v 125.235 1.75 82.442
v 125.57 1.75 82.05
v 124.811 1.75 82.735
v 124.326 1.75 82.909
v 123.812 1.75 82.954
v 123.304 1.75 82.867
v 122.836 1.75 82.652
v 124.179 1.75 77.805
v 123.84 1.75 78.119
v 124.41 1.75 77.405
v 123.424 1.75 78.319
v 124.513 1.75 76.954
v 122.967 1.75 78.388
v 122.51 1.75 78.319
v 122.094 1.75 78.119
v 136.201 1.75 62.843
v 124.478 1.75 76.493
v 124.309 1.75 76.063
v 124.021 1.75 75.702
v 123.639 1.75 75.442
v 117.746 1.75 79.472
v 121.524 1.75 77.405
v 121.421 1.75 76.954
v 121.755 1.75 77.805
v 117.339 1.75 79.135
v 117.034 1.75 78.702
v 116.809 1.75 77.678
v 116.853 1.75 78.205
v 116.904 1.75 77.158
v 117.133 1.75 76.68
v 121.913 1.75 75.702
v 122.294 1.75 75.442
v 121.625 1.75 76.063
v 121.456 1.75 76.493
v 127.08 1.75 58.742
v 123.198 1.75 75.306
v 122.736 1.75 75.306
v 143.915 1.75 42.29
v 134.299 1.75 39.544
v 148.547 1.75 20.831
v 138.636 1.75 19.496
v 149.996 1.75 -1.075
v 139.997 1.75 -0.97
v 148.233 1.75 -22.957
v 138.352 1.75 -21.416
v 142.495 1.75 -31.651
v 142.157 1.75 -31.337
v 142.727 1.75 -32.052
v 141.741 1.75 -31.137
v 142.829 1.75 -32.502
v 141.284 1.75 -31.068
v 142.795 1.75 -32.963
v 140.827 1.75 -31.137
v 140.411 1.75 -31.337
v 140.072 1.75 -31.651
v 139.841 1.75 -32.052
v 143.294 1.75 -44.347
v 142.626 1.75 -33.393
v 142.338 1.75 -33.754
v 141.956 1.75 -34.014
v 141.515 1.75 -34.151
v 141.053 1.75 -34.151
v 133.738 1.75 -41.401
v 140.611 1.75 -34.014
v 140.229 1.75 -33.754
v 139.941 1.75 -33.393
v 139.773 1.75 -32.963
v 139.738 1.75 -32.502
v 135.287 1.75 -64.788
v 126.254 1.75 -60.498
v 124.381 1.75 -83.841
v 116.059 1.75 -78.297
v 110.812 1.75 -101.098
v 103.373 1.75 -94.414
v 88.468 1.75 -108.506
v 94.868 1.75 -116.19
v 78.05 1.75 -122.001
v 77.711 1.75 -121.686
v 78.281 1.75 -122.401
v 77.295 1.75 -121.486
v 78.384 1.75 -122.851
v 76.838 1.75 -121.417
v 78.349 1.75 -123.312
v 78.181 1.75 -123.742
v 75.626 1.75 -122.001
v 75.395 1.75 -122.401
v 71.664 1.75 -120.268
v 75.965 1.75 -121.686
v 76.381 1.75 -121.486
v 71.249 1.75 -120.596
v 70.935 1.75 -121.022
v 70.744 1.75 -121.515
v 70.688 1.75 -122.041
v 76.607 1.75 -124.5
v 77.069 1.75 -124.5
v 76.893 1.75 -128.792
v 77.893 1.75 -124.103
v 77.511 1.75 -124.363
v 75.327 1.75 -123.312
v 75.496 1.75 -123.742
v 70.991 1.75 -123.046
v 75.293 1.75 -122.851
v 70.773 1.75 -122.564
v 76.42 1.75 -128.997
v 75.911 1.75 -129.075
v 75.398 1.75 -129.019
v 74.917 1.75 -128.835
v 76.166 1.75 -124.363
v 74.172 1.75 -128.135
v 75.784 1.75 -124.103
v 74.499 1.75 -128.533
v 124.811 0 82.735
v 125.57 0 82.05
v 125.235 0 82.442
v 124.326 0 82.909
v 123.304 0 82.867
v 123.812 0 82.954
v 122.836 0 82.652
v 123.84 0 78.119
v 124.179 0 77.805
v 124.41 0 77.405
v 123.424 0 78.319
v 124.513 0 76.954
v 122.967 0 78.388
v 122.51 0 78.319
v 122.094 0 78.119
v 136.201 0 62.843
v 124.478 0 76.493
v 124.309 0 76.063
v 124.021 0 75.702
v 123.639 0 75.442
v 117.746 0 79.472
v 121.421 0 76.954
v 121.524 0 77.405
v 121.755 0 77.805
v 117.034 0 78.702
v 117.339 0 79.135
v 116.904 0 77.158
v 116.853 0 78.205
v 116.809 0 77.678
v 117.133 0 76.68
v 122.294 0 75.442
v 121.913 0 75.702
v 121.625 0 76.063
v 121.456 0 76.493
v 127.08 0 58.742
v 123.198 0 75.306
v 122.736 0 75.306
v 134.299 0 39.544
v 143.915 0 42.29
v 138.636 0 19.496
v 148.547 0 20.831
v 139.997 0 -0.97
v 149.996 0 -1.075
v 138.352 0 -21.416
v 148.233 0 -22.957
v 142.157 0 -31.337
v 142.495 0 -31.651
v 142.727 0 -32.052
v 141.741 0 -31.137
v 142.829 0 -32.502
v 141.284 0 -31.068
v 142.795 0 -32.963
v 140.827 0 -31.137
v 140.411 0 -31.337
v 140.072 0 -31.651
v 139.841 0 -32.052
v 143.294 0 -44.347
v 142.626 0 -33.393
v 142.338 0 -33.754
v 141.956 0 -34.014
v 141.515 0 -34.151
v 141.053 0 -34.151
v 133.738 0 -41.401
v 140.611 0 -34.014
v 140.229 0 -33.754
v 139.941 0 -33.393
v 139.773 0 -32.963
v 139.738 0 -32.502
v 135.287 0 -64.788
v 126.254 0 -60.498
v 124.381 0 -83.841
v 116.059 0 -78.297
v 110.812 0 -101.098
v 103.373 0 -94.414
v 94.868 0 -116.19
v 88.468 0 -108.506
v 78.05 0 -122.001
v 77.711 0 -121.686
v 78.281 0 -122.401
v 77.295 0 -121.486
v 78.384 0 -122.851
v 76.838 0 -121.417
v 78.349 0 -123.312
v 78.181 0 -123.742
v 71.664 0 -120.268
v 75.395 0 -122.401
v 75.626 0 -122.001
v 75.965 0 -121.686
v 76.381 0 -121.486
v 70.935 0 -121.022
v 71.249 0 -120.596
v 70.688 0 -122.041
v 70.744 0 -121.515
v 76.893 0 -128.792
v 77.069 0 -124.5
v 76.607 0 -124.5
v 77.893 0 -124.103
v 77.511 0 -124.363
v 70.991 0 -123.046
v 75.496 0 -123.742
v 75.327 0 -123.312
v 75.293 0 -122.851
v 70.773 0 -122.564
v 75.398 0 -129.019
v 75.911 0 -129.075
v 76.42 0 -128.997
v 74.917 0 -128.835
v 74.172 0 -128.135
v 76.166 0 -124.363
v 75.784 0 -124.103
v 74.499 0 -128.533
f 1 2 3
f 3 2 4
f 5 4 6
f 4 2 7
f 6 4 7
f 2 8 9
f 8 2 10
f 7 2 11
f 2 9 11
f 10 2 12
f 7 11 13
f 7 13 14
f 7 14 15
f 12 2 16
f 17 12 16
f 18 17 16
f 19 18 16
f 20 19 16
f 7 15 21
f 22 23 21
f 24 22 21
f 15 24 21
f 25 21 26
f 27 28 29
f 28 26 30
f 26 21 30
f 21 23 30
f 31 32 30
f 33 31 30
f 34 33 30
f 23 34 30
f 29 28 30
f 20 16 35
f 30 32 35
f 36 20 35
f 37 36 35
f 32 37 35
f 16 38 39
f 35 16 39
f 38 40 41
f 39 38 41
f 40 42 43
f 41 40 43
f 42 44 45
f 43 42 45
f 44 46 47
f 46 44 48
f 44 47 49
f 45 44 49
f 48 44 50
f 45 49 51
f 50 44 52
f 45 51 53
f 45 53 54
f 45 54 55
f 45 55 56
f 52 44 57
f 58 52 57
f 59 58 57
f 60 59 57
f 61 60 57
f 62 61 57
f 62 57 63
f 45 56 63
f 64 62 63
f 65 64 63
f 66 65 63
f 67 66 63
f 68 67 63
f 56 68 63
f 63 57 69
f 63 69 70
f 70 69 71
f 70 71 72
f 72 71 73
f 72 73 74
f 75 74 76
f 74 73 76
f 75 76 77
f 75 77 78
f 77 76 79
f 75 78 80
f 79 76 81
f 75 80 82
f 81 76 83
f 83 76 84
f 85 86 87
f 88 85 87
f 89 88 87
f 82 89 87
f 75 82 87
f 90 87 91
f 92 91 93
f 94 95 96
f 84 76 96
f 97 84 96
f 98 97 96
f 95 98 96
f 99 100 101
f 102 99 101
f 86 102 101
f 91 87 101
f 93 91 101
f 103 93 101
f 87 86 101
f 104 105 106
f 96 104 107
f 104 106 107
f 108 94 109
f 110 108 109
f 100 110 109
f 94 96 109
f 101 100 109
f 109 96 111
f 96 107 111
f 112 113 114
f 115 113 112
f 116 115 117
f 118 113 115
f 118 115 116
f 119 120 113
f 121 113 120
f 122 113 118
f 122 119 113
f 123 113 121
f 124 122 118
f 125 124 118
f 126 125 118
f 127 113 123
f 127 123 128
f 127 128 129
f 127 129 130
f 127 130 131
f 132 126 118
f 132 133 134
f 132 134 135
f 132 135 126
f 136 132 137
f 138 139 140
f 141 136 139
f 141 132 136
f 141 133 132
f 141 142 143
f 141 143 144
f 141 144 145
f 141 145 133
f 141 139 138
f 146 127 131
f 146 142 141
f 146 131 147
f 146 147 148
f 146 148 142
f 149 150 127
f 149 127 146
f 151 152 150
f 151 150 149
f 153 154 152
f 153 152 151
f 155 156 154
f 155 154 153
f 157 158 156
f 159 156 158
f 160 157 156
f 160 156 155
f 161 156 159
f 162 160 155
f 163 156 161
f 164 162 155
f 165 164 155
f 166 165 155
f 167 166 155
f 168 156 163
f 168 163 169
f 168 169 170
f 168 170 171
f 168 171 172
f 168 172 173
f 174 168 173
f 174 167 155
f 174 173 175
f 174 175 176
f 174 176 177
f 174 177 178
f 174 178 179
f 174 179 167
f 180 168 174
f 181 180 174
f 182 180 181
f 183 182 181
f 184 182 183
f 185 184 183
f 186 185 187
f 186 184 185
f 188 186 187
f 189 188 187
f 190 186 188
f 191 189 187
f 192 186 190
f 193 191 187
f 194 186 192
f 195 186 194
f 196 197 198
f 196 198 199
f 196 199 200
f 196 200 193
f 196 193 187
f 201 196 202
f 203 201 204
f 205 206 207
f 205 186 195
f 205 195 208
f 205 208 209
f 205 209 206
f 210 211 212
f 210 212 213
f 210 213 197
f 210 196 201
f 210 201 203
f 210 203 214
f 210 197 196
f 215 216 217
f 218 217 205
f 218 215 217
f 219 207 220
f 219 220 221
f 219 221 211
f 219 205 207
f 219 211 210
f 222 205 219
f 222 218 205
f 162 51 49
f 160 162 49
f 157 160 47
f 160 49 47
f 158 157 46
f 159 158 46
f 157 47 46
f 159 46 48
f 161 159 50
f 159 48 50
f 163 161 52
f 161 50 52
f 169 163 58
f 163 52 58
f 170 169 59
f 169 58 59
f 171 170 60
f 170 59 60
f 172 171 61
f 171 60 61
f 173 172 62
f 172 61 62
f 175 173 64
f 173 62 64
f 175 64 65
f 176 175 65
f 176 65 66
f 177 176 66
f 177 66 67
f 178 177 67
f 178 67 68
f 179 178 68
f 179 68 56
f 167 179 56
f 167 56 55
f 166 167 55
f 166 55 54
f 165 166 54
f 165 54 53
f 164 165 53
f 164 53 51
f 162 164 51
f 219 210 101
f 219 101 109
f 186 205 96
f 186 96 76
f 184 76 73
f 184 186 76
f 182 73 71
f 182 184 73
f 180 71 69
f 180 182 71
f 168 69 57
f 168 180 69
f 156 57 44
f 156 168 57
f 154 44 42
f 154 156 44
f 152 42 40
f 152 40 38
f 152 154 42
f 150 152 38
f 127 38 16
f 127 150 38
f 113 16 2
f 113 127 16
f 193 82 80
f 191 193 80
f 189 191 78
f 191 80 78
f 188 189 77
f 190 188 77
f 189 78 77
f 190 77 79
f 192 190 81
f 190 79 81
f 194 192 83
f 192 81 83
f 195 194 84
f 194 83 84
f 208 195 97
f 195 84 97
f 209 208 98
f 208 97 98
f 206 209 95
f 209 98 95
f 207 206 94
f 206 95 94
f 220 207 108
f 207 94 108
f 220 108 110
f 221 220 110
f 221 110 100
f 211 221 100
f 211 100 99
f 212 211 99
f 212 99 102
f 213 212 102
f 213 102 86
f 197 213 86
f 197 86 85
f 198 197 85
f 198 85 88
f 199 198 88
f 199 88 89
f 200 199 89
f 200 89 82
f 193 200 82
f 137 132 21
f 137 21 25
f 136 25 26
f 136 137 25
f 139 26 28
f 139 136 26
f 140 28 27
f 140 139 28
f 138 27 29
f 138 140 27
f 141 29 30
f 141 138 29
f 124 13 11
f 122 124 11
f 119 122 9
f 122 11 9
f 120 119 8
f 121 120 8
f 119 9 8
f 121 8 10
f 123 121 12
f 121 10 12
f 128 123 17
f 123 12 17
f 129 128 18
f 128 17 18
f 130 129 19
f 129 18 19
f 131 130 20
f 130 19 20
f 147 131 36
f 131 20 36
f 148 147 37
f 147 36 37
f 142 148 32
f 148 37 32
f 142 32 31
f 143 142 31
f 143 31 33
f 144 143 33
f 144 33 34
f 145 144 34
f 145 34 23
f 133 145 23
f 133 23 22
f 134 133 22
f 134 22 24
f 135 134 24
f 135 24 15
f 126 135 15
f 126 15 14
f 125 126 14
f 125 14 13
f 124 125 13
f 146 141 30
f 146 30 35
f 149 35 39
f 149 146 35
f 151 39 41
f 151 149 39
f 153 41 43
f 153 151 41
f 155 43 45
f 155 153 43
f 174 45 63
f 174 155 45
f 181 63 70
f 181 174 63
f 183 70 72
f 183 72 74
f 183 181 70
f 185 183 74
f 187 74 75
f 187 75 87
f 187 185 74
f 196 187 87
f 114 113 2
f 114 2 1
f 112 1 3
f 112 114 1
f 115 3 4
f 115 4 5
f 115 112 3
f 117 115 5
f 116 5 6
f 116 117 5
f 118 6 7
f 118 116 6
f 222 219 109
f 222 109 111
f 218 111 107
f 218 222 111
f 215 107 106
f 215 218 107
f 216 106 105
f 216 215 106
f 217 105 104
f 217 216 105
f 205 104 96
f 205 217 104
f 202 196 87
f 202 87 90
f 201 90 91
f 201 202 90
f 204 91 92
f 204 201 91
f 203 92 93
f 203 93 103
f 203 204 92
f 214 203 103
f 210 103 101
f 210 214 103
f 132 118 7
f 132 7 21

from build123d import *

# Parameters (mm, degrees)
BOSS_EXTRUDE1_DEPTH  = 1.75
MOUNTING_HOLES_REACH = 199.898
SKETCH2_R            = 1.55


with BuildPart() as part:
    # Sketch1 → Boss-Extrude1 (new body)
    with BuildSketch(Plane(origin=(0, 0, 0), x_dir=(1, 0, 0), z_dir=(0, 1, 0))):
        with BuildLine():
            Line((70.99149995, 123.045548212), (74.17169656, 128.134926657))
            ThreePointArc((74.17169656, 128.134926657), (75.398161995, 129.019168104), (76.893033195, 128.792319049))
            ThreePointArc((76.893033195, 128.792319049), (146.155509718, 33.742658152), (125.569837037, -82.050082429))
            ThreePointArc((125.569837037, -82.050082429), (124.325699782, -82.909281411), (122.835734015, -82.652177522))
            Line((122.835734015, -82.652177522), (117.74635557, -79.471980911))
            ThreePointArc((117.74635557, -79.471980911), (116.852809957, -78.205175291), (117.132867421, -76.680449723))
            ThreePointArc((117.132867421, -76.680449723), (136.41180907, 31.493147608), (71.663827182, 120.267601097))
            ThreePointArc((71.663827182, 120.267601097), (70.743717505, 121.515246248), (70.99149995, 123.045548212))
        make_face()
    extrude(amount=BOSS_EXTRUDE1_DEPTH)

    # Sketch2 → Mounting_Holes (cut, up to next)
    with BuildSketch(Plane(origin=(0, 1.75, 0), x_dir=(1, 0, 0), z_dir=(0, 1, 0)), mode=Mode.PRIVATE) as mounting_holes_sk1:
        with Locations(Location((122.966973943, -76.838293314, 0), (0, 0, 270))):
            Circle(SKETCH2_R)
    mounting_holes_tool1 = extrude(mounting_holes_sk1.sketch, amount=-MOUNTING_HOLES_REACH, mode=Mode.PRIVATE) & part.part
    # Sketch2 → Mounting_Holes (cut, up to next)
    with BuildSketch(Plane(origin=(0, 1.75, 0), x_dir=(1, 0, 0), z_dir=(0, 1, 0)), mode=Mode.PRIVATE) as mounting_holes_sk2:
        with Locations(Location((141.283659394, 32.61790288, 0), (0, 0, 270))):
            Circle(SKETCH2_R)
    mounting_holes_tool2 = extrude(mounting_holes_sk2.sketch, amount=-MOUNTING_HOLES_REACH, mode=Mode.PRIVATE) & part.part
    # Sketch2 → Mounting_Holes (cut, up to next)
    with BuildSketch(Plane(origin=(0, 1.75, 0), x_dir=(1, 0, 0), z_dir=(0, 1, 0)), mode=Mode.PRIVATE) as mounting_holes_sk3:
        with Locations(Location((76.838293314, 122.966973943, 0), (0, 0, 270))):
            Circle(SKETCH2_R)
    mounting_holes_tool3 = extrude(mounting_holes_sk3.sketch, amount=-MOUNTING_HOLES_REACH, mode=Mode.PRIVATE) & part.part
    add(mounting_holes_tool1.solids().sort_by_distance((122.966974, 1.75, 76.838293))[0], mode=Mode.SUBTRACT)
    add(mounting_holes_tool2.solids().sort_by_distance((141.283659, 1.75, -32.617903))[0], mode=Mode.SUBTRACT)
    add(mounting_holes_tool3.solids().sort_by_distance((76.838293, 1.75, -122.966974))[0], mode=Mode.SUBTRACT)


solid = part.part
